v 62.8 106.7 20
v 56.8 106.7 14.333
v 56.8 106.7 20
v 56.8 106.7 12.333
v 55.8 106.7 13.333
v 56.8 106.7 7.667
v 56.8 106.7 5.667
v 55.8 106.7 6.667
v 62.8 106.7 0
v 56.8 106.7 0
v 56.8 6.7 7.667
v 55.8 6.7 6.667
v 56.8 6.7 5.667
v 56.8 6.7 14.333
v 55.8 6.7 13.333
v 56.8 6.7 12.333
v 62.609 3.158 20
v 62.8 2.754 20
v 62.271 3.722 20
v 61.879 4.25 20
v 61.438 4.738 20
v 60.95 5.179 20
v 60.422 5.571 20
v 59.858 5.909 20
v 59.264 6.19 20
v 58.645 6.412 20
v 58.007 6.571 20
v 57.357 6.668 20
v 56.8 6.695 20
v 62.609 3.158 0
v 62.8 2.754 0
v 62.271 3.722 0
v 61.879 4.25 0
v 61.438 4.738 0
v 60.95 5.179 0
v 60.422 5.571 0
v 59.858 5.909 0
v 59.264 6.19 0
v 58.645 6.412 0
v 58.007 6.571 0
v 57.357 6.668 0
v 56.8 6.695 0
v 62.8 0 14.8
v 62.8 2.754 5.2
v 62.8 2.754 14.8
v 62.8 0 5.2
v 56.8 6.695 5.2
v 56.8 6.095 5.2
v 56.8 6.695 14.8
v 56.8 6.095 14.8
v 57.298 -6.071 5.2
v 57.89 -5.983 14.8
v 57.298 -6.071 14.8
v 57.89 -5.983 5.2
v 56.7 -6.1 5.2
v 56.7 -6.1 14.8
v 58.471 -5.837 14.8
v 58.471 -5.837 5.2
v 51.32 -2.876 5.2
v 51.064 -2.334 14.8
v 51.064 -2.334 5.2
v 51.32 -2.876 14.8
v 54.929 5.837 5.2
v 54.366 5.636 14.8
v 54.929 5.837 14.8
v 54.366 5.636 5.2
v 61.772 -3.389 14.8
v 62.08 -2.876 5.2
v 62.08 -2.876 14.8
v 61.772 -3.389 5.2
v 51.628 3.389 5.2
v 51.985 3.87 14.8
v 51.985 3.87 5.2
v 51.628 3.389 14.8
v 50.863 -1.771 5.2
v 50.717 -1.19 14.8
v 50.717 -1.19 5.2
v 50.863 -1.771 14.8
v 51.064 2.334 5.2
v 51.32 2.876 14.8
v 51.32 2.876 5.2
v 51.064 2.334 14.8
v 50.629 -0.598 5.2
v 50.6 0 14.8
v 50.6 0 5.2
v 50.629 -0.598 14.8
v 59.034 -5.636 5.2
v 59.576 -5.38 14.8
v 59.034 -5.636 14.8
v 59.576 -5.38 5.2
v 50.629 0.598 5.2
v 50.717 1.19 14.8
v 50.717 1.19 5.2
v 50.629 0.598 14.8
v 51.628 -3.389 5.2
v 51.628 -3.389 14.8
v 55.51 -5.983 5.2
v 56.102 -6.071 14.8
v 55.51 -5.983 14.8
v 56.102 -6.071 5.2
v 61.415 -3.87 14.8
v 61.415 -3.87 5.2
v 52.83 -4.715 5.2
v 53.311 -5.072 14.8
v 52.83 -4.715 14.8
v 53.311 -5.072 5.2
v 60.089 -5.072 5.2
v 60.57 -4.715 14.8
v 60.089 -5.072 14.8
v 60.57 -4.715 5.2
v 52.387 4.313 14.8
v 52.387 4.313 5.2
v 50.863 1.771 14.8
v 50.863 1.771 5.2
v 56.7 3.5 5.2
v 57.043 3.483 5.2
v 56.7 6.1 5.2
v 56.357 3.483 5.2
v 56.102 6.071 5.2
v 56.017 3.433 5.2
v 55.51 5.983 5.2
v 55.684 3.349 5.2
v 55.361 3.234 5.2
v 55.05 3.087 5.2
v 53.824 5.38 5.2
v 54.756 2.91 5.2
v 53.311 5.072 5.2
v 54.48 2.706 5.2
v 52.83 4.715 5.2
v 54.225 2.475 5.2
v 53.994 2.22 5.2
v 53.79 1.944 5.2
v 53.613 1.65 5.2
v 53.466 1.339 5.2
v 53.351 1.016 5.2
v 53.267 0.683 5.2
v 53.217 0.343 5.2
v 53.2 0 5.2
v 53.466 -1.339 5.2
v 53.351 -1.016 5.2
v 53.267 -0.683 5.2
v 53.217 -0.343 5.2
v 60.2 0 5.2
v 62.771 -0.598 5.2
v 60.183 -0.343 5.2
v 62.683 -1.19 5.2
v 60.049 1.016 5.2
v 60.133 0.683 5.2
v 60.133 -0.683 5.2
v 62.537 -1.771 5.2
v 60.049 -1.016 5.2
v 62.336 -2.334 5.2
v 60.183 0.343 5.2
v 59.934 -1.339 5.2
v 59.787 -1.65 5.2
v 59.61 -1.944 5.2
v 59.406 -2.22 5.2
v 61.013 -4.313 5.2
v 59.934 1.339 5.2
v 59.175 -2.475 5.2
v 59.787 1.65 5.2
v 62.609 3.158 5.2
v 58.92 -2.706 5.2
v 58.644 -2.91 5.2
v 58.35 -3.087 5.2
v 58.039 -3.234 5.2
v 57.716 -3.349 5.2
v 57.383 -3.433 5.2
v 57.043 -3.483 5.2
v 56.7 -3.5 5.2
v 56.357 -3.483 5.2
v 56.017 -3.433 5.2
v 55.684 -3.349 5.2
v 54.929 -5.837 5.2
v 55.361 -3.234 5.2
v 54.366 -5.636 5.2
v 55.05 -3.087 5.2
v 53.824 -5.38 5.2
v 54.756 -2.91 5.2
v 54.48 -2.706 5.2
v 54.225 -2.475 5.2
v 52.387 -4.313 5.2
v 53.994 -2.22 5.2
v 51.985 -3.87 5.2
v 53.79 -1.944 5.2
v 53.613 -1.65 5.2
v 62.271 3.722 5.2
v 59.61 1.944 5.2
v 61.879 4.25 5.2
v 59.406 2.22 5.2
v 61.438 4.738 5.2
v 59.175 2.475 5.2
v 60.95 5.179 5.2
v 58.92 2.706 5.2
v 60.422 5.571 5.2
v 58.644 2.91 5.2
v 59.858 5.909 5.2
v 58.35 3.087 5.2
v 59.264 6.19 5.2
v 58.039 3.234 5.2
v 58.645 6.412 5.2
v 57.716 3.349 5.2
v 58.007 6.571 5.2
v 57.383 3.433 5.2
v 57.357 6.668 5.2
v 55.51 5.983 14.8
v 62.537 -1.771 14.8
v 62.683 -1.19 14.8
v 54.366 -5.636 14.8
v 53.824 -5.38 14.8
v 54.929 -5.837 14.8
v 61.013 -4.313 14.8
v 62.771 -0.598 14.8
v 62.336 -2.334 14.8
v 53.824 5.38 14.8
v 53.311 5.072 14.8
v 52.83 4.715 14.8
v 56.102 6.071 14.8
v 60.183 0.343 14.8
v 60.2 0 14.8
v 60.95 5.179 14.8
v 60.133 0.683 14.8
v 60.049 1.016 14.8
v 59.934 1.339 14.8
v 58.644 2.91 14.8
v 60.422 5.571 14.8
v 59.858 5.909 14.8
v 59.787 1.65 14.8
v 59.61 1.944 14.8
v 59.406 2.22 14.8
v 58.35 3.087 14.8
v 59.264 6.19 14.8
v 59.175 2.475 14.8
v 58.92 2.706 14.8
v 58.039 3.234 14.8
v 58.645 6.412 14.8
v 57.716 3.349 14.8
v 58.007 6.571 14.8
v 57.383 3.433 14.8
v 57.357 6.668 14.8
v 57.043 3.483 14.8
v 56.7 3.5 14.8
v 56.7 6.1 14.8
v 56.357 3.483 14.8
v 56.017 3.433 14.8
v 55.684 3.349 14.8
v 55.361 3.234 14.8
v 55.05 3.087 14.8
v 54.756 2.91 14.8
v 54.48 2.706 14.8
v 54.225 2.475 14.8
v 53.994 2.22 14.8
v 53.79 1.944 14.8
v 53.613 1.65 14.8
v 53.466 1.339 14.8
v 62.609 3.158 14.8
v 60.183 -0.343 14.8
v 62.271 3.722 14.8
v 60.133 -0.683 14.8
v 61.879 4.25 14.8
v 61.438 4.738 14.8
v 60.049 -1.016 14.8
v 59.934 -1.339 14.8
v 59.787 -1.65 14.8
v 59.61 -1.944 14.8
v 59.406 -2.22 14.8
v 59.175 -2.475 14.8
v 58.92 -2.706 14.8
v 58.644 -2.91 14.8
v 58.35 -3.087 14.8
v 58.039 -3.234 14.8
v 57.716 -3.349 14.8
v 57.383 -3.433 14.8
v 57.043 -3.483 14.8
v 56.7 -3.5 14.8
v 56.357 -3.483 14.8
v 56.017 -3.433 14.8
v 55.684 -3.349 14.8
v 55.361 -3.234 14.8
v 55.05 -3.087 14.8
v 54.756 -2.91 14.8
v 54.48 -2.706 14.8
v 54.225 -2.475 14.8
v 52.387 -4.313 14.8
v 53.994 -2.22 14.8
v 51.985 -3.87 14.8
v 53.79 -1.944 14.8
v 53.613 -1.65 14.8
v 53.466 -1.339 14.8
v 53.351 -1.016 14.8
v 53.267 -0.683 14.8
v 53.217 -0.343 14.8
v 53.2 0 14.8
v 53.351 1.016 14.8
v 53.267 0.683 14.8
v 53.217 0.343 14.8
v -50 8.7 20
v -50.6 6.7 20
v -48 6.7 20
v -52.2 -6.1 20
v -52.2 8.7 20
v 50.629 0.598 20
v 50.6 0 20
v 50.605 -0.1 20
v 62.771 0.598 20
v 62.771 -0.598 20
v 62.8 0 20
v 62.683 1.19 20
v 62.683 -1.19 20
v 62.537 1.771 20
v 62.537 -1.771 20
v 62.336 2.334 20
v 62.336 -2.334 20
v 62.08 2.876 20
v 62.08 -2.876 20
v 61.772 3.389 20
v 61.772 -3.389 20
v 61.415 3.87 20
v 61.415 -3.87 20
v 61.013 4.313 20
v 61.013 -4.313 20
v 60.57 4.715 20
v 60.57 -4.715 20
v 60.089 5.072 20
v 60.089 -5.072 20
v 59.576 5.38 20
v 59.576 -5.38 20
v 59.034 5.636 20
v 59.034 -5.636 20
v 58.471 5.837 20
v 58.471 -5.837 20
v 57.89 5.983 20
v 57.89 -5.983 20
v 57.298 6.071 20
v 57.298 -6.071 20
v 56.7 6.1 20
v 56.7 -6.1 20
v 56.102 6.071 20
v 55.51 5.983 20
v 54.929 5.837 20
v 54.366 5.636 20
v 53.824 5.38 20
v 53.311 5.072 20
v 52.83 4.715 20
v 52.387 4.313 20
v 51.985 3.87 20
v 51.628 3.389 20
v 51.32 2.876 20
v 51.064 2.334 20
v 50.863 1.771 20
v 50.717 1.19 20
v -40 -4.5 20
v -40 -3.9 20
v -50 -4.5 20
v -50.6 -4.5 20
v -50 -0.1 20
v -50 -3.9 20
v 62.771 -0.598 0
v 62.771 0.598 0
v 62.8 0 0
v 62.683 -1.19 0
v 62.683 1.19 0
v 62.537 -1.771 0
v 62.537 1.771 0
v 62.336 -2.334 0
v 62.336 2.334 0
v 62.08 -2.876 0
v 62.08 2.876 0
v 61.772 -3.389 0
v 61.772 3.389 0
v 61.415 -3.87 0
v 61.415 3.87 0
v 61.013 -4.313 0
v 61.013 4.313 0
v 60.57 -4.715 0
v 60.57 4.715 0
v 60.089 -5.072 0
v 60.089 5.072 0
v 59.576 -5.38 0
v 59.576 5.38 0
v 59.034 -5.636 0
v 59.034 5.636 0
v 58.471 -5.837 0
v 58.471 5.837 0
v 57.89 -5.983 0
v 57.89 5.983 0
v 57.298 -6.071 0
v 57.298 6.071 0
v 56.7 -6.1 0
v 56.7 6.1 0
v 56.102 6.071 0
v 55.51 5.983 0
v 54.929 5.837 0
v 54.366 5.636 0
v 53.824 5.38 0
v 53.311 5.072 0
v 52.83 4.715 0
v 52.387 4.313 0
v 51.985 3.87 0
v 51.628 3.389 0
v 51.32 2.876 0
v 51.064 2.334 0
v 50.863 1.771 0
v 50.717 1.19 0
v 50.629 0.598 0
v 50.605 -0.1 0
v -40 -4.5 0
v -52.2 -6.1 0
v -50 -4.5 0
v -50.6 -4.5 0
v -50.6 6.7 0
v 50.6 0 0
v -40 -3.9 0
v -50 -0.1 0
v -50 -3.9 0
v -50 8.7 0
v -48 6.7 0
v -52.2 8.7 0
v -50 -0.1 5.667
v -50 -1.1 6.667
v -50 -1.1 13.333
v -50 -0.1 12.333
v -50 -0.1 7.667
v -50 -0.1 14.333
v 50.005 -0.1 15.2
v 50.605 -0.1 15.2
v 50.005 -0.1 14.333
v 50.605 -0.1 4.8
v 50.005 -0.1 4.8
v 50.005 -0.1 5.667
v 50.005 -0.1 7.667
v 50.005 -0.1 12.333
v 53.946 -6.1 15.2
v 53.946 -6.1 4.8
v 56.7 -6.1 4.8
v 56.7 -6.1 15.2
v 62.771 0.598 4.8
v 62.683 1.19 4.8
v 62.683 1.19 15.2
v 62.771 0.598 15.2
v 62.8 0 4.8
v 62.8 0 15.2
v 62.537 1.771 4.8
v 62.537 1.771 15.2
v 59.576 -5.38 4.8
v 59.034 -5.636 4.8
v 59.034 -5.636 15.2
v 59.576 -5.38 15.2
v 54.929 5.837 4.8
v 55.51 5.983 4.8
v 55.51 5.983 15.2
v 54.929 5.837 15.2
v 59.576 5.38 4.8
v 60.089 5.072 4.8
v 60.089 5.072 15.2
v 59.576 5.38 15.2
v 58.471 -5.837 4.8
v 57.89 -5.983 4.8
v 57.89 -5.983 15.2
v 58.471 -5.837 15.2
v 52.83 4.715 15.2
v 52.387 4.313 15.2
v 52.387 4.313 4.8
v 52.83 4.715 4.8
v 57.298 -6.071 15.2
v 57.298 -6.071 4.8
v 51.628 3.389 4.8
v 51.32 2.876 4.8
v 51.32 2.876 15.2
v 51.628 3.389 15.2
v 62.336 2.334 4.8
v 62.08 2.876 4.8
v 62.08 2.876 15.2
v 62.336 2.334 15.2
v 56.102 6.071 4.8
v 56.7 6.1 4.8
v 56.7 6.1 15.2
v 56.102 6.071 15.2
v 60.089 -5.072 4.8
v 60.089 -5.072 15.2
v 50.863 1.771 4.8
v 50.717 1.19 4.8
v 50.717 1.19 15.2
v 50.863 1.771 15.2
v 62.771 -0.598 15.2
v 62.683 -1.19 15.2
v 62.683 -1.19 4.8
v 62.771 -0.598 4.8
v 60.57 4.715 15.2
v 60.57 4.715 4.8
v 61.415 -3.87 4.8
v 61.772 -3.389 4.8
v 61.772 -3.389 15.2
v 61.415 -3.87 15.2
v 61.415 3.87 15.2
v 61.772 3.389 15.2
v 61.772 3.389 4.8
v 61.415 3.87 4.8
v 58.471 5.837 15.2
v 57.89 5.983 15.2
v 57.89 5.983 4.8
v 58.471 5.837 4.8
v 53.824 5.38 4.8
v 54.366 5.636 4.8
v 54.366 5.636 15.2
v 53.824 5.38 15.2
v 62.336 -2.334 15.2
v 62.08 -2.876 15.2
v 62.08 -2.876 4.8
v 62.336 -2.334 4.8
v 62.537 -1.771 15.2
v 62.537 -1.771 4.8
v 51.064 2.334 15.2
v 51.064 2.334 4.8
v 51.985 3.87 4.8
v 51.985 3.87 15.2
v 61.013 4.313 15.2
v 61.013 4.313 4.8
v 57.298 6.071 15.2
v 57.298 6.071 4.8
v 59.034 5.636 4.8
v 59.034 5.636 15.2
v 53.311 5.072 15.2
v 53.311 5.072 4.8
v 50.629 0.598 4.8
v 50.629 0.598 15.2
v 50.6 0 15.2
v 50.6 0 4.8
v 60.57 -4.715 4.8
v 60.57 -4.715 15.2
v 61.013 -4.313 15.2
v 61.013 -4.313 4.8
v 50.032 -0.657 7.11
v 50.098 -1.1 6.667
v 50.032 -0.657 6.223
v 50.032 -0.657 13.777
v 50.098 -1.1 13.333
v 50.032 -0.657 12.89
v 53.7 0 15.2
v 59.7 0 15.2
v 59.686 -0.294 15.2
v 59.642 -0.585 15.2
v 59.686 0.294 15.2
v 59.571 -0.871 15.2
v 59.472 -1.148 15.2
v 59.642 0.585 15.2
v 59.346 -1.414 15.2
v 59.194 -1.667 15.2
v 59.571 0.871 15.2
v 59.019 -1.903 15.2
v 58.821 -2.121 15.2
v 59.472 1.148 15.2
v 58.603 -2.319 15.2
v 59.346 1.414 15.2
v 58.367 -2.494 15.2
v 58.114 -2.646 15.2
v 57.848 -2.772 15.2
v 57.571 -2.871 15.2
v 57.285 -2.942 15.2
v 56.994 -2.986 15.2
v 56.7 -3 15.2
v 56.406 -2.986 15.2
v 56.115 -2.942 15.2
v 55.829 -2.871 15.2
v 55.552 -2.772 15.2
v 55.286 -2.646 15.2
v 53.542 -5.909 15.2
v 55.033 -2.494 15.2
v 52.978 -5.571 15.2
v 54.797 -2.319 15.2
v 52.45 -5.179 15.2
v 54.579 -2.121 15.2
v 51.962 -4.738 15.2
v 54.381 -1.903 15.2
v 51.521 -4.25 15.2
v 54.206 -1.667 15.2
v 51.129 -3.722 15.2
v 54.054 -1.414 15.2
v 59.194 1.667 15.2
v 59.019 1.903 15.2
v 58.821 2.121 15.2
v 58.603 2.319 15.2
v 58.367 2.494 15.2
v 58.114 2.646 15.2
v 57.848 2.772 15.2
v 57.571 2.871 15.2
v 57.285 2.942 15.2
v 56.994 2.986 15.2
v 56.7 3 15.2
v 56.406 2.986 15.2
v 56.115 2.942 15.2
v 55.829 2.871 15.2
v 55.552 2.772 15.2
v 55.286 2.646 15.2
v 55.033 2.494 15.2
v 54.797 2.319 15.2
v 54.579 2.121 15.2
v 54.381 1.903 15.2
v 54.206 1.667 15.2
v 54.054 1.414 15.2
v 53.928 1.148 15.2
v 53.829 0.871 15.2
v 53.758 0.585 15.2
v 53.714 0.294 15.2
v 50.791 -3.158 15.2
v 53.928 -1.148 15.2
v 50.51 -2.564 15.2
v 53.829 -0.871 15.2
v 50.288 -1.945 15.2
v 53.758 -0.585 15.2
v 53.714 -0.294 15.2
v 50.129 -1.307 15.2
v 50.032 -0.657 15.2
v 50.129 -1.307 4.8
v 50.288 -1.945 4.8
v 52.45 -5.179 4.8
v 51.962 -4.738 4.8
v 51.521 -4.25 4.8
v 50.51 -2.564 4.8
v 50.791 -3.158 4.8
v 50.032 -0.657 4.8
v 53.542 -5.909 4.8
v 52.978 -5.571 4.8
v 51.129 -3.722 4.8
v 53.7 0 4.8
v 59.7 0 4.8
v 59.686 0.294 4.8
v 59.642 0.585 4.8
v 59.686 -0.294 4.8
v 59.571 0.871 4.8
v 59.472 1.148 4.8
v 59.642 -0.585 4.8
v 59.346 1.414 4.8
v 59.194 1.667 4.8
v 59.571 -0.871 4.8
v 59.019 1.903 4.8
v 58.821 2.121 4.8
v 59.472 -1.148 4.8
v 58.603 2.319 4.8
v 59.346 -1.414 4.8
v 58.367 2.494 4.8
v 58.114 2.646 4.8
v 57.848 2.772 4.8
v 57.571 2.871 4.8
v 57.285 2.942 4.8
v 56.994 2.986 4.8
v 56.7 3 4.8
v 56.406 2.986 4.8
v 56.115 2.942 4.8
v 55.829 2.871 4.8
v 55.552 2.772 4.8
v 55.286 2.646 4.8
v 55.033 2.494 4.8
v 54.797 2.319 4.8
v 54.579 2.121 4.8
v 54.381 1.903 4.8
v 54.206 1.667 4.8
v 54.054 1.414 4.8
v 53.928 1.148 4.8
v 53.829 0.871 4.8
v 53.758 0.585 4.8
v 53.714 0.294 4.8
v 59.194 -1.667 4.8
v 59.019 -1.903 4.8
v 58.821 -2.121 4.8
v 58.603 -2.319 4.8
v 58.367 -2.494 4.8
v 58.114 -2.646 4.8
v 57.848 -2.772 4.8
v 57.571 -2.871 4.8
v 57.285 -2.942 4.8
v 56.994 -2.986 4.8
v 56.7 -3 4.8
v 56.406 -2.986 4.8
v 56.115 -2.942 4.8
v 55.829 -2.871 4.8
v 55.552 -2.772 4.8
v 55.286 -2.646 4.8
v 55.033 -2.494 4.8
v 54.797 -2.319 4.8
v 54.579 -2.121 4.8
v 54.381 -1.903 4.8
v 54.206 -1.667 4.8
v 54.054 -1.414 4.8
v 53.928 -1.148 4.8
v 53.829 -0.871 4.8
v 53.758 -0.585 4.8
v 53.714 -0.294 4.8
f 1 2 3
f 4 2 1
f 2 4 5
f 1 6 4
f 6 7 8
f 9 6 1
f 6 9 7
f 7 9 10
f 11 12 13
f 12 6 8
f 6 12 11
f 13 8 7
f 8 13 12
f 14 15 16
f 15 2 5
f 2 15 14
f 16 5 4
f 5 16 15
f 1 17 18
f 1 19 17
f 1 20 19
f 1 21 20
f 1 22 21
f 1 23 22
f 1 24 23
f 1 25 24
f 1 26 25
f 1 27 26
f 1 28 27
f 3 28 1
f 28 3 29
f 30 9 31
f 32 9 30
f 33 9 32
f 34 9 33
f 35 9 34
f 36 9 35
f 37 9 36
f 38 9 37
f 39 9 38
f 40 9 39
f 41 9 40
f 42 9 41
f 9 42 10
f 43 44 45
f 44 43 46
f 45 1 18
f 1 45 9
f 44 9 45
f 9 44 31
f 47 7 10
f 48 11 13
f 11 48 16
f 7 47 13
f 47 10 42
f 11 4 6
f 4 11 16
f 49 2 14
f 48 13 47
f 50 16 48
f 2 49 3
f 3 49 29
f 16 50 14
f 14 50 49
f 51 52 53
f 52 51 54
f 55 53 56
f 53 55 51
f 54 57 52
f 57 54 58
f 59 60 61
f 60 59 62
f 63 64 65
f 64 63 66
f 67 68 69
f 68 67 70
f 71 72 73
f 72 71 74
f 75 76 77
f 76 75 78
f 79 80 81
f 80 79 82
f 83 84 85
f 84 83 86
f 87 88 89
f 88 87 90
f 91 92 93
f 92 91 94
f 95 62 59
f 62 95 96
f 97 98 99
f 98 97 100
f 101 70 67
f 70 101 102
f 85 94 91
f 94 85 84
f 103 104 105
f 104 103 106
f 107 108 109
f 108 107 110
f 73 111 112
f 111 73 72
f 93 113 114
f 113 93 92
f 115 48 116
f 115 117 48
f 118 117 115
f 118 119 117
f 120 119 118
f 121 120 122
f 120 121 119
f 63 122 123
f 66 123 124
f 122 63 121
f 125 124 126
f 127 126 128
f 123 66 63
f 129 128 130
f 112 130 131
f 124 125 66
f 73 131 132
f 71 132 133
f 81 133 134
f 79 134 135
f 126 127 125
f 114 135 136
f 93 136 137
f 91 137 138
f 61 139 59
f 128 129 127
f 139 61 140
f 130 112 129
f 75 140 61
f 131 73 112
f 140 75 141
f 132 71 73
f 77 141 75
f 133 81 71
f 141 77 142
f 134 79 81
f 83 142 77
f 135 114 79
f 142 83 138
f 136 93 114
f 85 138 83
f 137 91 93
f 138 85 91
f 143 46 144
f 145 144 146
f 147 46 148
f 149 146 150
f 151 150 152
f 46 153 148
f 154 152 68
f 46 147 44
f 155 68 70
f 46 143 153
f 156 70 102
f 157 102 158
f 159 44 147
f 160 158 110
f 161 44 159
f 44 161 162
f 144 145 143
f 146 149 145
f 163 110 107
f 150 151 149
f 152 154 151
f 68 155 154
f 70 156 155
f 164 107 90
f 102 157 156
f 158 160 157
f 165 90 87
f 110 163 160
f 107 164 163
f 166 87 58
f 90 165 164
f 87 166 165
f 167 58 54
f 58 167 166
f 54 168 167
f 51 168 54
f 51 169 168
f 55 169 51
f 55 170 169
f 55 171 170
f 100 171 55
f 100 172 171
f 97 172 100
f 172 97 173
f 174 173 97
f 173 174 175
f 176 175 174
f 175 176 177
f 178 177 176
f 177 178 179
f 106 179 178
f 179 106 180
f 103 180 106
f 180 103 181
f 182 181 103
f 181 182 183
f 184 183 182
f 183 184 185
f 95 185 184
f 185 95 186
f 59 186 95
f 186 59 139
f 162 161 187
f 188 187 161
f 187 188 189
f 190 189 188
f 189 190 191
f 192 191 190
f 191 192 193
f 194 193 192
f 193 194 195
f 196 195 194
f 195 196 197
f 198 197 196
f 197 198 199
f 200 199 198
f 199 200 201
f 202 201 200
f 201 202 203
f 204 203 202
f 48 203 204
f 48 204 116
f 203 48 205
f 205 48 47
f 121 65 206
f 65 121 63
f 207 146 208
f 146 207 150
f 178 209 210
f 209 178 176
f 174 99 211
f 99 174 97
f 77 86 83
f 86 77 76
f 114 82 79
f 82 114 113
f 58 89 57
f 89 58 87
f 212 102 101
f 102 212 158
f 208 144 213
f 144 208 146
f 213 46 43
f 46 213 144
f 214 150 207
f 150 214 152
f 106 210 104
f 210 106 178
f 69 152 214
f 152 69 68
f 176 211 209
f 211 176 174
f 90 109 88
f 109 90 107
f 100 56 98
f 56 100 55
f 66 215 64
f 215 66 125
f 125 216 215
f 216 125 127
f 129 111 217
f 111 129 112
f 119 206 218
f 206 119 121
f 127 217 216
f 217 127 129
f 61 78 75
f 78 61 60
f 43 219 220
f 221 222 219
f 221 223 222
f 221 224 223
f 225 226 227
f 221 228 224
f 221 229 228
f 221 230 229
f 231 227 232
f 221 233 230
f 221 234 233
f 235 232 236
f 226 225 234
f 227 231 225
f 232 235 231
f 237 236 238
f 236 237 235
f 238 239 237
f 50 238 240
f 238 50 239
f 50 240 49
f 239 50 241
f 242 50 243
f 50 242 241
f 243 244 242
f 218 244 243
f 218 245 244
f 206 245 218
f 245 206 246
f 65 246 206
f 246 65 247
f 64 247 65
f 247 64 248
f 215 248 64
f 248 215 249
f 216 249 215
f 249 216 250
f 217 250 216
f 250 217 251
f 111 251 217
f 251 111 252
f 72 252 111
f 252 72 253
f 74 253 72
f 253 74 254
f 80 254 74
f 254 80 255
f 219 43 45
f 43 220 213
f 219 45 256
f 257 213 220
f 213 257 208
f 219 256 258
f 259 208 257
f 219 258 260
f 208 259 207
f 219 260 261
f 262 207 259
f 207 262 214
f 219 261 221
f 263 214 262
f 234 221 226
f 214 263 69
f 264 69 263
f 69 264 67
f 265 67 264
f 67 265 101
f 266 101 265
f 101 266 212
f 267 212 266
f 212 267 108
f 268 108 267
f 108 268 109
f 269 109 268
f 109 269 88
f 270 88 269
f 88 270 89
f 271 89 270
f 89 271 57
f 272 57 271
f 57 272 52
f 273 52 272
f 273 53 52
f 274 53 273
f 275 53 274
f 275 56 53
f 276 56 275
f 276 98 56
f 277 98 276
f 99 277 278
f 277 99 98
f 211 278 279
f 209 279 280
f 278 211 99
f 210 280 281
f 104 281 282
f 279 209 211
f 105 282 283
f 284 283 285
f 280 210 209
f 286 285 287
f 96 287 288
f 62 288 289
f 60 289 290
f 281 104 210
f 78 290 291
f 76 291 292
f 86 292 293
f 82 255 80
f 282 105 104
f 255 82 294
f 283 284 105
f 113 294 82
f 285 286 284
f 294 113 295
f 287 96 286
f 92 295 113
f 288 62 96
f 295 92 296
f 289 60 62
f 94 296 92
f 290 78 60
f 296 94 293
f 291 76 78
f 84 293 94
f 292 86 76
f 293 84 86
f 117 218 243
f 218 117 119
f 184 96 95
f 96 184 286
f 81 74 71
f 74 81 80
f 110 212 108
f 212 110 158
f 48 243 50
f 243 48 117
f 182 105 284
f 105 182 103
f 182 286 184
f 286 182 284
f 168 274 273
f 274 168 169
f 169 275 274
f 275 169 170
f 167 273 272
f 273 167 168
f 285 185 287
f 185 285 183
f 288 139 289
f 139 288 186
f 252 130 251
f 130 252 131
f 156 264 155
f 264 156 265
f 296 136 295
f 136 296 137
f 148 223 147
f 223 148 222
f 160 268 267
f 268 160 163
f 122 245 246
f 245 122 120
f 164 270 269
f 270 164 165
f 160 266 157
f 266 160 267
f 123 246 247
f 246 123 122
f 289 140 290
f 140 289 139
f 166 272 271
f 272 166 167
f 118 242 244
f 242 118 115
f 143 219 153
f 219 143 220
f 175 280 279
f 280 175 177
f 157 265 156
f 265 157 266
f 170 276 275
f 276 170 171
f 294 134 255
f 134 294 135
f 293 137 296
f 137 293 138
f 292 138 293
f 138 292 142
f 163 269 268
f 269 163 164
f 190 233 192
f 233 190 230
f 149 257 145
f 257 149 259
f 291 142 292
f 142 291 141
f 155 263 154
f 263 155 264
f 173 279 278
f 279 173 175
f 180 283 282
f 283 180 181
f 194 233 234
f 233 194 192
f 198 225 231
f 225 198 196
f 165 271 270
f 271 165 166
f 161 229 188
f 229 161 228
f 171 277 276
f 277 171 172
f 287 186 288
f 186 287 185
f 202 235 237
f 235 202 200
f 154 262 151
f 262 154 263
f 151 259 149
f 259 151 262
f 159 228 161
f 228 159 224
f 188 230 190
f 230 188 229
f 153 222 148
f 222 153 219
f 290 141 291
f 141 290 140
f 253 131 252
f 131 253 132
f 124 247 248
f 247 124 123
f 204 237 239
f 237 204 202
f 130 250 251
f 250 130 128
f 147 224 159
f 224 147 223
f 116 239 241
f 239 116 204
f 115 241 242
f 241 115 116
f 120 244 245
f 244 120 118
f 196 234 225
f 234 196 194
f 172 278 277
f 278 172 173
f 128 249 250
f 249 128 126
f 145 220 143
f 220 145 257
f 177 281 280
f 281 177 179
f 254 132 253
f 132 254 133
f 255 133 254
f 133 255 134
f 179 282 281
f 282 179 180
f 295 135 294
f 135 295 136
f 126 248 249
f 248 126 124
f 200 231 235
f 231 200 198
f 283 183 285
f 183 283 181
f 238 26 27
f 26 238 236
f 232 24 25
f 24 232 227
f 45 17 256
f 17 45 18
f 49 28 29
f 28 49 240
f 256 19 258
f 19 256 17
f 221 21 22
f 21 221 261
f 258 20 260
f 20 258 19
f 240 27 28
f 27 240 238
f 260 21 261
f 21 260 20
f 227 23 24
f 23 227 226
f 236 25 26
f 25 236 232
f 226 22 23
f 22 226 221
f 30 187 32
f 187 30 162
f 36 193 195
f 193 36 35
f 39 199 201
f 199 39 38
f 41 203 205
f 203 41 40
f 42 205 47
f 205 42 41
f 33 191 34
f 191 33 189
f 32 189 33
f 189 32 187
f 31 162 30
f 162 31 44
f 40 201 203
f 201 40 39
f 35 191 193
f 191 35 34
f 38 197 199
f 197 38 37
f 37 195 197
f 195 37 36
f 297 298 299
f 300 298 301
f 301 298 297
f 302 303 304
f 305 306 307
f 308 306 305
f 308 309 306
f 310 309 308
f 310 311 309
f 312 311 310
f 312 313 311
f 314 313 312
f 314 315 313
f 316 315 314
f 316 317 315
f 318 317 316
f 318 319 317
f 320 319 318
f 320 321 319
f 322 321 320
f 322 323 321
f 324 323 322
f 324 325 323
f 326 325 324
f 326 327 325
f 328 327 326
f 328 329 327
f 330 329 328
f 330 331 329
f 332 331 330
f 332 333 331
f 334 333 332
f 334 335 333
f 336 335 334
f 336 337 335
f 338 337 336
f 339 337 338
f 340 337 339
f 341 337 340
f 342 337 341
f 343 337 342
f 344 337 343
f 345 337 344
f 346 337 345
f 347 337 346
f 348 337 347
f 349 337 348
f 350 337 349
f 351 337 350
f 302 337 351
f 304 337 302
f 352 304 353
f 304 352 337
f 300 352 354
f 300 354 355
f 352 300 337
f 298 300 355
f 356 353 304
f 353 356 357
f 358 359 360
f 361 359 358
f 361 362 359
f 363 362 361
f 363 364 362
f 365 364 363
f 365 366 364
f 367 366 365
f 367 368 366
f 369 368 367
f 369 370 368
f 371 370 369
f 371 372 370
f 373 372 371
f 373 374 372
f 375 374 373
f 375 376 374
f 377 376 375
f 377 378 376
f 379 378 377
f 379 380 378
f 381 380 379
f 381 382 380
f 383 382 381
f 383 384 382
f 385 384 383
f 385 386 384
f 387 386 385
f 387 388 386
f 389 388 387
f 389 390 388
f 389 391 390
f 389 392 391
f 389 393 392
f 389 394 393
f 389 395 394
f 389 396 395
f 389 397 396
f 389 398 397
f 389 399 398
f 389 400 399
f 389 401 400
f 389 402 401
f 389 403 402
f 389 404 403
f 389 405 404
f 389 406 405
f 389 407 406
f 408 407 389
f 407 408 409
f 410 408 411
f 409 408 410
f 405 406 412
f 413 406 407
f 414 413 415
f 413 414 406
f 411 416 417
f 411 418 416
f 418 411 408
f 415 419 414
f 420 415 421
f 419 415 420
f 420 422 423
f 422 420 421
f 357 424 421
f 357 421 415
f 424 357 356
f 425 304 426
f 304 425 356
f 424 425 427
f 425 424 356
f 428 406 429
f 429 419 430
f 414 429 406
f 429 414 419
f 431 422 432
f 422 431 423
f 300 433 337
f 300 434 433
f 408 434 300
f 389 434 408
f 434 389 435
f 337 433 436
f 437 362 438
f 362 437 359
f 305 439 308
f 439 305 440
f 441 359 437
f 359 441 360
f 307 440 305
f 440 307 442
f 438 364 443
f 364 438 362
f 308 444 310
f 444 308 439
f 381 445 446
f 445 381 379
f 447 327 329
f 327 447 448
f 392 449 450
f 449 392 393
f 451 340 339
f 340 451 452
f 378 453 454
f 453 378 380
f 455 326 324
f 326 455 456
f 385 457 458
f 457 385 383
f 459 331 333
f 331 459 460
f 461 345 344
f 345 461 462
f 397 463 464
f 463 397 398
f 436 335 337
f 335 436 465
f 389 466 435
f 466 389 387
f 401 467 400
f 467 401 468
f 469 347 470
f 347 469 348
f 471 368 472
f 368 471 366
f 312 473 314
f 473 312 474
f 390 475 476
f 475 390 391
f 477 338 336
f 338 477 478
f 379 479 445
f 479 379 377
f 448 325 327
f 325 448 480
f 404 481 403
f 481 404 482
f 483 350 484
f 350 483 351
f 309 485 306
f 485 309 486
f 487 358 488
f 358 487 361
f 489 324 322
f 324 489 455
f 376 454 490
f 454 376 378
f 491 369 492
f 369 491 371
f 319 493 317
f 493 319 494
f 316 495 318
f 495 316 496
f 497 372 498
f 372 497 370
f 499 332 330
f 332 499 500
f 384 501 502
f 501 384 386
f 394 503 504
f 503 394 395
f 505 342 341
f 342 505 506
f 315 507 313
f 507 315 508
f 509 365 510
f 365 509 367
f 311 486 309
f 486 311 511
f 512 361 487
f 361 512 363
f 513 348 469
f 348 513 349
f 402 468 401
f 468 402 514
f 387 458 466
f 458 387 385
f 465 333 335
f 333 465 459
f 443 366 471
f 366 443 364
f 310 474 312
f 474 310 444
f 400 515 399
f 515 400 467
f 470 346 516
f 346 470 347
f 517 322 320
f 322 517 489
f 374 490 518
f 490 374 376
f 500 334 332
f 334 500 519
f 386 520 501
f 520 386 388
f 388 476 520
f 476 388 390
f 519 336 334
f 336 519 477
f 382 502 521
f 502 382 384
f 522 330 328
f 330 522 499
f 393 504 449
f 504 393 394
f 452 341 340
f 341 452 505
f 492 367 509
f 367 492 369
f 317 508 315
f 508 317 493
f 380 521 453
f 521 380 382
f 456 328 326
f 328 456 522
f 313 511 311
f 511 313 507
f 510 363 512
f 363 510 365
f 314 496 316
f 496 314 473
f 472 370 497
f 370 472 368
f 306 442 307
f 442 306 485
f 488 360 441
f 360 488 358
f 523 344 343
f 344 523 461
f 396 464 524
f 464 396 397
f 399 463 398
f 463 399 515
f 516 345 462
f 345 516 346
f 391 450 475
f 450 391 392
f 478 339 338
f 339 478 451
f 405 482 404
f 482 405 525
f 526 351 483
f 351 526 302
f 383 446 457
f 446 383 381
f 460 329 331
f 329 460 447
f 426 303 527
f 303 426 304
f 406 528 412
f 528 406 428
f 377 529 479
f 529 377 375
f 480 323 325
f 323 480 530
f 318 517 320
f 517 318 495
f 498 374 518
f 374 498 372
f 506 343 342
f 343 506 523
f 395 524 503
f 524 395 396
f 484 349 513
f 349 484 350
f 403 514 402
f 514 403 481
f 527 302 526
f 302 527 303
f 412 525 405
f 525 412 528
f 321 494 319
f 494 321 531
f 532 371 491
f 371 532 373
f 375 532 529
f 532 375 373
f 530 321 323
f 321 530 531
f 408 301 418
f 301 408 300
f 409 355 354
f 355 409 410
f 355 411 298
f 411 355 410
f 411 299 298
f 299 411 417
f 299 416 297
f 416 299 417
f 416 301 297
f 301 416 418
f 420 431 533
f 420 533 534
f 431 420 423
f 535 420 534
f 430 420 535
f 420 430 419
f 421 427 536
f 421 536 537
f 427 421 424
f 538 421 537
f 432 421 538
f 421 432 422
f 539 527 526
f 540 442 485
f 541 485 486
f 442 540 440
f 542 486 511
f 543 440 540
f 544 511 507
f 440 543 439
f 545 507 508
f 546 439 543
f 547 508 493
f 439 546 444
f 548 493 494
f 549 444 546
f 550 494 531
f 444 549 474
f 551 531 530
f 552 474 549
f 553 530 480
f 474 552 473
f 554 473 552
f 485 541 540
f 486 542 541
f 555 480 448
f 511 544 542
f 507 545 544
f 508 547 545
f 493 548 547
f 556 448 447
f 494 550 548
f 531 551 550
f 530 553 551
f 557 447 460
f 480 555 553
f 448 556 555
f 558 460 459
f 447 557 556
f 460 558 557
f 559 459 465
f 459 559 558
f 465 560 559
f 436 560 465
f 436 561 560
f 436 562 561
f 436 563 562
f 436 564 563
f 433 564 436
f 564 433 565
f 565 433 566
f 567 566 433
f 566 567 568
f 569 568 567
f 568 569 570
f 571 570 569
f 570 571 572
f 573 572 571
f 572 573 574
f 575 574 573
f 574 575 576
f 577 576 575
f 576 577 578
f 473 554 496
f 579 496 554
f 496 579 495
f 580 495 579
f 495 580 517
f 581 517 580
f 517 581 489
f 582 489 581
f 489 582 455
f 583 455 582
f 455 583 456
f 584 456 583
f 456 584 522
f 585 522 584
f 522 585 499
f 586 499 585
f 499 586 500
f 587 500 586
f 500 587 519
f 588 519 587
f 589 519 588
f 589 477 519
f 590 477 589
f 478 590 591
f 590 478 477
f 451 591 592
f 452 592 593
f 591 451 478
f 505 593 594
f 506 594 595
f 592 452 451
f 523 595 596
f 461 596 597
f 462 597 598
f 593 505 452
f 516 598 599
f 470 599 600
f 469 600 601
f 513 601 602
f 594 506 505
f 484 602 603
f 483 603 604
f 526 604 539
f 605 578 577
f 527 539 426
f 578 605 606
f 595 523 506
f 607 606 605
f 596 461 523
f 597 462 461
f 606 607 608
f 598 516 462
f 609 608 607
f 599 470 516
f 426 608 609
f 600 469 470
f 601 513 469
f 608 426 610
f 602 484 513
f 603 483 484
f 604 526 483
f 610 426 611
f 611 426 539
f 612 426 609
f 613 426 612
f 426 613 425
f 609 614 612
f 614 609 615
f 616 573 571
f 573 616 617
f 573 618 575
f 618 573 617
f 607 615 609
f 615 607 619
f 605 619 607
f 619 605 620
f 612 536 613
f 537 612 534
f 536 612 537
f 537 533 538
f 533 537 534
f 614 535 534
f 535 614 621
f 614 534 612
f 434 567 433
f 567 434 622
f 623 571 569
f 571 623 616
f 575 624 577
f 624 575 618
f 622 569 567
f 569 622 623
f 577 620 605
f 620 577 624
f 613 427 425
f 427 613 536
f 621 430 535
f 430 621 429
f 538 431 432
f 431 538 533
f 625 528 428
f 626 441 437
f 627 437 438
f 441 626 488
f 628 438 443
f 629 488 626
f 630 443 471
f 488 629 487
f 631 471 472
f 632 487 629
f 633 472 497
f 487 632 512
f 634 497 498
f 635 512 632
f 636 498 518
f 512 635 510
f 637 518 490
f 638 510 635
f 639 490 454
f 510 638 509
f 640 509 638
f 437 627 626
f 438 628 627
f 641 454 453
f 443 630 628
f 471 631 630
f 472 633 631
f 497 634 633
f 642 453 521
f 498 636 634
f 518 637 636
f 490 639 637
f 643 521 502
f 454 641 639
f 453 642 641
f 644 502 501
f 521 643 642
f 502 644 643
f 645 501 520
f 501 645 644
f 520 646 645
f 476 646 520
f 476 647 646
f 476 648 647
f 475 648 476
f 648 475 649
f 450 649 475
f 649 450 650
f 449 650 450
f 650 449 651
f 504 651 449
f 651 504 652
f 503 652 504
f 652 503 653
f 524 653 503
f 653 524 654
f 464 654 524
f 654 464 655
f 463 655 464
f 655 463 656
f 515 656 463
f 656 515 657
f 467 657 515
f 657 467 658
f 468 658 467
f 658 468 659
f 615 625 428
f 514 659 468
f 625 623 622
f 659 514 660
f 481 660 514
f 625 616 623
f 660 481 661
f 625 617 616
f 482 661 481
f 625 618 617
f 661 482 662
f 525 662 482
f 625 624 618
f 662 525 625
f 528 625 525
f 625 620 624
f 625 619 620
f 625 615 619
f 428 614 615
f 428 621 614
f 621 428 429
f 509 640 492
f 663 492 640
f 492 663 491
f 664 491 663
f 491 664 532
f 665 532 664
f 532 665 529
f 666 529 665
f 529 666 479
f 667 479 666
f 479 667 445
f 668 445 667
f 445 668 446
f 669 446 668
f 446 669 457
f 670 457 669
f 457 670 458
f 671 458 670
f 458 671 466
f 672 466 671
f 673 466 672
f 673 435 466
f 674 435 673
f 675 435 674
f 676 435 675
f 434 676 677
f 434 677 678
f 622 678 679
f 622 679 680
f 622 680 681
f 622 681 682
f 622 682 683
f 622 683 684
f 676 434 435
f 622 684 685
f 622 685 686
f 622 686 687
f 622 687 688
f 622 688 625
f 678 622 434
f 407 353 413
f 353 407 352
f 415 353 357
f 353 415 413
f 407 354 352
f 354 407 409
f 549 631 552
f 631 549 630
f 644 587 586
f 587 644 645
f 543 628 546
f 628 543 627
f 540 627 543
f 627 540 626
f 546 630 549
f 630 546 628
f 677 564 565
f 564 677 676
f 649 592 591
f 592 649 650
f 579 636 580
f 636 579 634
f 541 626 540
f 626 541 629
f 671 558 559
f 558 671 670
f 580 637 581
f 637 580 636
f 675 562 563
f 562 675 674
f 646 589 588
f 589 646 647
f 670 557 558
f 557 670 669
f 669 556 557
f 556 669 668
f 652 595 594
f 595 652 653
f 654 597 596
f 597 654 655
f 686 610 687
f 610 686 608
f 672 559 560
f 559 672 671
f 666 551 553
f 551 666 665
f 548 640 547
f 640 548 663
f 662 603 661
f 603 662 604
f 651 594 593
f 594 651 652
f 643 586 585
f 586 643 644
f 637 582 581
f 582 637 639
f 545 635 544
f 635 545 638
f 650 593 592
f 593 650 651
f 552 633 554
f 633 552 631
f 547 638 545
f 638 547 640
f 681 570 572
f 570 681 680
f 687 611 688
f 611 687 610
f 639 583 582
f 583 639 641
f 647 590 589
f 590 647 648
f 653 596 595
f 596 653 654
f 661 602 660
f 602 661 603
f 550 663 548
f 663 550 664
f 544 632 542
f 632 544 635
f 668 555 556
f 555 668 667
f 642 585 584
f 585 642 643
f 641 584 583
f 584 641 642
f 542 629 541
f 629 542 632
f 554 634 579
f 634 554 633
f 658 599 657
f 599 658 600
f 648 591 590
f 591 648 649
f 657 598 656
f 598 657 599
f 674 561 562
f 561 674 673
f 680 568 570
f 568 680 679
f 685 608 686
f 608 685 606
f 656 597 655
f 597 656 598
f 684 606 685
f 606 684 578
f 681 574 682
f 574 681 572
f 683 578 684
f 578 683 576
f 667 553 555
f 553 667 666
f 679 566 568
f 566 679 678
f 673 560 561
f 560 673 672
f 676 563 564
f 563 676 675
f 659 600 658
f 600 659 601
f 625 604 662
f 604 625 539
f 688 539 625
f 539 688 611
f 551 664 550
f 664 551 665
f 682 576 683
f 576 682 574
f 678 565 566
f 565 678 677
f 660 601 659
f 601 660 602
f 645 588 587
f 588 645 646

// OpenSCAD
//!OpenSCAD

// The useable length of the Clip
Clip_Length = 100;
// The height of the clip
Clip_Height = 20;
// The thickness of one of the two arms
Arm_Thickness = 6;

// Your extrusion width (Width of the molten plastic trace of your nozzle - Usally your nozzle diameter)
Extrusion_Width = 0.4;
// Your layer height
Layer_Height = 0.2;

// The amount of noses and slots to create
Amount_Noses = 2;
// The length how far a nose is standing out
Noses_Size = 1;

// The angle how far the clip is opened
Opening_Angle = 90;

// How much the clip has to be bowed to snap (I recommend 2mm for PLA and 3mm for ABS)
Clip_Overstand = 2;

//Circle Resolution
$fn = 64;

translate([0,0,Clip_Height/2])
union() {
    // Upper part
    translate([Clip_Length/2 + Arm_Thickness + 1.75*Extrusion_Width, 0, 0])
        rotate([0, 0, -Opening_Angle])
            translate([-Clip_Length/2 - Arm_Thickness - 1.75*Extrusion_Width, 0, 0])
                difference() {
                    union() {
                        translate([(Arm_Thickness + 1.75*Extrusion_Width)/2, Arm_Thickness/2 + Extrusion_Width/4, 0])
                            cube([Clip_Length + Arm_Thickness + 1.75*Extrusion_Width, Arm_Thickness, Clip_Height], center=true);
    
                        for(i = [1 : 1 : Amount_Noses]) 
                            translate([0, Extrusion_Width/4, -Clip_Height/2 + i*Clip_Height/(Amount_Noses + 1)])
                                rotate([45,0,0])
                                    cube([Clip_Length, sqrt(2)*Noses_Size, sqrt(2)*Noses_Size], center=true);
    
                        translate([Clip_Length/2 + Arm_Thickness + 1.75*Extrusion_Width, 0, 0])
                            cylinder(r = Arm_Thickness + Extrusion_Width/4, h = Clip_Height/2-2*Layer_Height, center=true);
                    }
                    
                    translate([Clip_Length/2 + Arm_Thickness + 1.75*Extrusion_Width, 0, 0])
                        cylinder(r = Arm_Thickness/2 + 1.25*Extrusion_Width, h = Clip_Height/2-2*Layer_Height, center=true);
                    
                    translate([Clip_Length/2 + Arm_Thickness + 1.75*Extrusion_Width, 0, 0.375*Clip_Height - Layer_Height/2])
                            cylinder(r = Arm_Thickness + 1.75*Extrusion_Width, h = Clip_Height/4 + Layer_Height, center=true);
                    
                    translate([Clip_Length/2 + Arm_Thickness + 1.75*Extrusion_Width, 0, -0.375*Clip_Height + Layer_Height/2])
                            cylinder(r = Arm_Thickness + 1.75*Extrusion_Width, h = Clip_Height/4 + Layer_Height, center=true);
                }
    
    // Lower part
    difference() {
        union() {
            translate([(Arm_Thickness + 1.75*Extrusion_Width)/2, -Arm_Thickness/2 - Extrusion_Width/4, 0])
                cube([Clip_Length + Arm_Thickness + 1.75*Extrusion_Width, Arm_Thickness, Clip_Height], center=true);
            
            translate([Clip_Length/2 + Arm_Thickness + 1.75*Extrusion_Width, 0, 0])
                cylinder(r = Arm_Thickness + Extrusion_Width/4, h = Clip_Height, center=true);
            
            translate([-(Clip_Length + 5.5*Extrusion_Width)/2, -Arm_Thickness + 1.75*Extrusion_Width, 0])
                cube([5.5*Extrusion_Width, 4*Extrusion_Width, Clip_Height], center=true);
            
            translate([-Clip_Length/2 - 3.5*Extrusion_Width, 0.75*Extrusion_Width, 0])
                cube([4*Extrusion_Width, 2*Arm_Thickness + 2*Extrusion_Width, Clip_Height], center=true);
            
            translate([-Clip_Length/2 - 5.5*Extrusion_Width, Arm_Thickness + 1.75*Extrusion_Width , 0])
                polyhedron( points = [[0, 0, -Clip_Height/2], [Clip_Overstand + 5.5*Extrusion_Width, 0, -Clip_Height/2], [5.5*Extrusion_Width, Clip_Overstand, -Clip_Height/2], [0, Clip_Overstand, -Clip_Height/2], [0, 0, Clip_Height/2], [Clip_Overstand + 5.5*Extrusion_Width, 0, Clip_Height/2], [5.5*Extrusion_Width, Clip_Overstand, Clip_Height/2], [0, Clip_Overstand, Clip_Height/2]], faces = [[0,1,2,3], [4,7,6,5], [0,4,5,1], [1,5,6,2], [2,6,7,3], [3,7,4,0]], convexity = 10);
        }
        
        for(i = [1 : 1 : Amount_Noses]) 
            translate([Extrusion_Width/4, -Extrusion_Width/4, -Clip_Height/2 + i*Clip_Height/(Amount_Noses + 1)])
                rotate([45,0,0])
                    cube([Clip_Length + Extrusion_Width/2, sqrt(2)*Noses_Size, sqrt(2)*Noses_Size], center=true);
        
        translate([Clip_Length/2 + Arm_Thickness + 1.75*Extrusion_Width, 0, 0])
            cylinder(r = Arm_Thickness + 1.75*Extrusion_Width, h = Clip_Height/2+2*Layer_Height, center=true);
        
        translate([-Clip_Length/2 + Clip_Height/4, -Arm_Thickness + 4.5*Extrusion_Width, 0])
            cube([Clip_Height/2, 1.5*Extrusion_Width, Clip_Height], center=true);
    }
    
    //Axle
    translate([Clip_Length/2 + Arm_Thickness + 1.75*Extrusion_Width, 0, 0])
            cylinder(r = Arm_Thickness/2, h = Clip_Height, center=true);
}
